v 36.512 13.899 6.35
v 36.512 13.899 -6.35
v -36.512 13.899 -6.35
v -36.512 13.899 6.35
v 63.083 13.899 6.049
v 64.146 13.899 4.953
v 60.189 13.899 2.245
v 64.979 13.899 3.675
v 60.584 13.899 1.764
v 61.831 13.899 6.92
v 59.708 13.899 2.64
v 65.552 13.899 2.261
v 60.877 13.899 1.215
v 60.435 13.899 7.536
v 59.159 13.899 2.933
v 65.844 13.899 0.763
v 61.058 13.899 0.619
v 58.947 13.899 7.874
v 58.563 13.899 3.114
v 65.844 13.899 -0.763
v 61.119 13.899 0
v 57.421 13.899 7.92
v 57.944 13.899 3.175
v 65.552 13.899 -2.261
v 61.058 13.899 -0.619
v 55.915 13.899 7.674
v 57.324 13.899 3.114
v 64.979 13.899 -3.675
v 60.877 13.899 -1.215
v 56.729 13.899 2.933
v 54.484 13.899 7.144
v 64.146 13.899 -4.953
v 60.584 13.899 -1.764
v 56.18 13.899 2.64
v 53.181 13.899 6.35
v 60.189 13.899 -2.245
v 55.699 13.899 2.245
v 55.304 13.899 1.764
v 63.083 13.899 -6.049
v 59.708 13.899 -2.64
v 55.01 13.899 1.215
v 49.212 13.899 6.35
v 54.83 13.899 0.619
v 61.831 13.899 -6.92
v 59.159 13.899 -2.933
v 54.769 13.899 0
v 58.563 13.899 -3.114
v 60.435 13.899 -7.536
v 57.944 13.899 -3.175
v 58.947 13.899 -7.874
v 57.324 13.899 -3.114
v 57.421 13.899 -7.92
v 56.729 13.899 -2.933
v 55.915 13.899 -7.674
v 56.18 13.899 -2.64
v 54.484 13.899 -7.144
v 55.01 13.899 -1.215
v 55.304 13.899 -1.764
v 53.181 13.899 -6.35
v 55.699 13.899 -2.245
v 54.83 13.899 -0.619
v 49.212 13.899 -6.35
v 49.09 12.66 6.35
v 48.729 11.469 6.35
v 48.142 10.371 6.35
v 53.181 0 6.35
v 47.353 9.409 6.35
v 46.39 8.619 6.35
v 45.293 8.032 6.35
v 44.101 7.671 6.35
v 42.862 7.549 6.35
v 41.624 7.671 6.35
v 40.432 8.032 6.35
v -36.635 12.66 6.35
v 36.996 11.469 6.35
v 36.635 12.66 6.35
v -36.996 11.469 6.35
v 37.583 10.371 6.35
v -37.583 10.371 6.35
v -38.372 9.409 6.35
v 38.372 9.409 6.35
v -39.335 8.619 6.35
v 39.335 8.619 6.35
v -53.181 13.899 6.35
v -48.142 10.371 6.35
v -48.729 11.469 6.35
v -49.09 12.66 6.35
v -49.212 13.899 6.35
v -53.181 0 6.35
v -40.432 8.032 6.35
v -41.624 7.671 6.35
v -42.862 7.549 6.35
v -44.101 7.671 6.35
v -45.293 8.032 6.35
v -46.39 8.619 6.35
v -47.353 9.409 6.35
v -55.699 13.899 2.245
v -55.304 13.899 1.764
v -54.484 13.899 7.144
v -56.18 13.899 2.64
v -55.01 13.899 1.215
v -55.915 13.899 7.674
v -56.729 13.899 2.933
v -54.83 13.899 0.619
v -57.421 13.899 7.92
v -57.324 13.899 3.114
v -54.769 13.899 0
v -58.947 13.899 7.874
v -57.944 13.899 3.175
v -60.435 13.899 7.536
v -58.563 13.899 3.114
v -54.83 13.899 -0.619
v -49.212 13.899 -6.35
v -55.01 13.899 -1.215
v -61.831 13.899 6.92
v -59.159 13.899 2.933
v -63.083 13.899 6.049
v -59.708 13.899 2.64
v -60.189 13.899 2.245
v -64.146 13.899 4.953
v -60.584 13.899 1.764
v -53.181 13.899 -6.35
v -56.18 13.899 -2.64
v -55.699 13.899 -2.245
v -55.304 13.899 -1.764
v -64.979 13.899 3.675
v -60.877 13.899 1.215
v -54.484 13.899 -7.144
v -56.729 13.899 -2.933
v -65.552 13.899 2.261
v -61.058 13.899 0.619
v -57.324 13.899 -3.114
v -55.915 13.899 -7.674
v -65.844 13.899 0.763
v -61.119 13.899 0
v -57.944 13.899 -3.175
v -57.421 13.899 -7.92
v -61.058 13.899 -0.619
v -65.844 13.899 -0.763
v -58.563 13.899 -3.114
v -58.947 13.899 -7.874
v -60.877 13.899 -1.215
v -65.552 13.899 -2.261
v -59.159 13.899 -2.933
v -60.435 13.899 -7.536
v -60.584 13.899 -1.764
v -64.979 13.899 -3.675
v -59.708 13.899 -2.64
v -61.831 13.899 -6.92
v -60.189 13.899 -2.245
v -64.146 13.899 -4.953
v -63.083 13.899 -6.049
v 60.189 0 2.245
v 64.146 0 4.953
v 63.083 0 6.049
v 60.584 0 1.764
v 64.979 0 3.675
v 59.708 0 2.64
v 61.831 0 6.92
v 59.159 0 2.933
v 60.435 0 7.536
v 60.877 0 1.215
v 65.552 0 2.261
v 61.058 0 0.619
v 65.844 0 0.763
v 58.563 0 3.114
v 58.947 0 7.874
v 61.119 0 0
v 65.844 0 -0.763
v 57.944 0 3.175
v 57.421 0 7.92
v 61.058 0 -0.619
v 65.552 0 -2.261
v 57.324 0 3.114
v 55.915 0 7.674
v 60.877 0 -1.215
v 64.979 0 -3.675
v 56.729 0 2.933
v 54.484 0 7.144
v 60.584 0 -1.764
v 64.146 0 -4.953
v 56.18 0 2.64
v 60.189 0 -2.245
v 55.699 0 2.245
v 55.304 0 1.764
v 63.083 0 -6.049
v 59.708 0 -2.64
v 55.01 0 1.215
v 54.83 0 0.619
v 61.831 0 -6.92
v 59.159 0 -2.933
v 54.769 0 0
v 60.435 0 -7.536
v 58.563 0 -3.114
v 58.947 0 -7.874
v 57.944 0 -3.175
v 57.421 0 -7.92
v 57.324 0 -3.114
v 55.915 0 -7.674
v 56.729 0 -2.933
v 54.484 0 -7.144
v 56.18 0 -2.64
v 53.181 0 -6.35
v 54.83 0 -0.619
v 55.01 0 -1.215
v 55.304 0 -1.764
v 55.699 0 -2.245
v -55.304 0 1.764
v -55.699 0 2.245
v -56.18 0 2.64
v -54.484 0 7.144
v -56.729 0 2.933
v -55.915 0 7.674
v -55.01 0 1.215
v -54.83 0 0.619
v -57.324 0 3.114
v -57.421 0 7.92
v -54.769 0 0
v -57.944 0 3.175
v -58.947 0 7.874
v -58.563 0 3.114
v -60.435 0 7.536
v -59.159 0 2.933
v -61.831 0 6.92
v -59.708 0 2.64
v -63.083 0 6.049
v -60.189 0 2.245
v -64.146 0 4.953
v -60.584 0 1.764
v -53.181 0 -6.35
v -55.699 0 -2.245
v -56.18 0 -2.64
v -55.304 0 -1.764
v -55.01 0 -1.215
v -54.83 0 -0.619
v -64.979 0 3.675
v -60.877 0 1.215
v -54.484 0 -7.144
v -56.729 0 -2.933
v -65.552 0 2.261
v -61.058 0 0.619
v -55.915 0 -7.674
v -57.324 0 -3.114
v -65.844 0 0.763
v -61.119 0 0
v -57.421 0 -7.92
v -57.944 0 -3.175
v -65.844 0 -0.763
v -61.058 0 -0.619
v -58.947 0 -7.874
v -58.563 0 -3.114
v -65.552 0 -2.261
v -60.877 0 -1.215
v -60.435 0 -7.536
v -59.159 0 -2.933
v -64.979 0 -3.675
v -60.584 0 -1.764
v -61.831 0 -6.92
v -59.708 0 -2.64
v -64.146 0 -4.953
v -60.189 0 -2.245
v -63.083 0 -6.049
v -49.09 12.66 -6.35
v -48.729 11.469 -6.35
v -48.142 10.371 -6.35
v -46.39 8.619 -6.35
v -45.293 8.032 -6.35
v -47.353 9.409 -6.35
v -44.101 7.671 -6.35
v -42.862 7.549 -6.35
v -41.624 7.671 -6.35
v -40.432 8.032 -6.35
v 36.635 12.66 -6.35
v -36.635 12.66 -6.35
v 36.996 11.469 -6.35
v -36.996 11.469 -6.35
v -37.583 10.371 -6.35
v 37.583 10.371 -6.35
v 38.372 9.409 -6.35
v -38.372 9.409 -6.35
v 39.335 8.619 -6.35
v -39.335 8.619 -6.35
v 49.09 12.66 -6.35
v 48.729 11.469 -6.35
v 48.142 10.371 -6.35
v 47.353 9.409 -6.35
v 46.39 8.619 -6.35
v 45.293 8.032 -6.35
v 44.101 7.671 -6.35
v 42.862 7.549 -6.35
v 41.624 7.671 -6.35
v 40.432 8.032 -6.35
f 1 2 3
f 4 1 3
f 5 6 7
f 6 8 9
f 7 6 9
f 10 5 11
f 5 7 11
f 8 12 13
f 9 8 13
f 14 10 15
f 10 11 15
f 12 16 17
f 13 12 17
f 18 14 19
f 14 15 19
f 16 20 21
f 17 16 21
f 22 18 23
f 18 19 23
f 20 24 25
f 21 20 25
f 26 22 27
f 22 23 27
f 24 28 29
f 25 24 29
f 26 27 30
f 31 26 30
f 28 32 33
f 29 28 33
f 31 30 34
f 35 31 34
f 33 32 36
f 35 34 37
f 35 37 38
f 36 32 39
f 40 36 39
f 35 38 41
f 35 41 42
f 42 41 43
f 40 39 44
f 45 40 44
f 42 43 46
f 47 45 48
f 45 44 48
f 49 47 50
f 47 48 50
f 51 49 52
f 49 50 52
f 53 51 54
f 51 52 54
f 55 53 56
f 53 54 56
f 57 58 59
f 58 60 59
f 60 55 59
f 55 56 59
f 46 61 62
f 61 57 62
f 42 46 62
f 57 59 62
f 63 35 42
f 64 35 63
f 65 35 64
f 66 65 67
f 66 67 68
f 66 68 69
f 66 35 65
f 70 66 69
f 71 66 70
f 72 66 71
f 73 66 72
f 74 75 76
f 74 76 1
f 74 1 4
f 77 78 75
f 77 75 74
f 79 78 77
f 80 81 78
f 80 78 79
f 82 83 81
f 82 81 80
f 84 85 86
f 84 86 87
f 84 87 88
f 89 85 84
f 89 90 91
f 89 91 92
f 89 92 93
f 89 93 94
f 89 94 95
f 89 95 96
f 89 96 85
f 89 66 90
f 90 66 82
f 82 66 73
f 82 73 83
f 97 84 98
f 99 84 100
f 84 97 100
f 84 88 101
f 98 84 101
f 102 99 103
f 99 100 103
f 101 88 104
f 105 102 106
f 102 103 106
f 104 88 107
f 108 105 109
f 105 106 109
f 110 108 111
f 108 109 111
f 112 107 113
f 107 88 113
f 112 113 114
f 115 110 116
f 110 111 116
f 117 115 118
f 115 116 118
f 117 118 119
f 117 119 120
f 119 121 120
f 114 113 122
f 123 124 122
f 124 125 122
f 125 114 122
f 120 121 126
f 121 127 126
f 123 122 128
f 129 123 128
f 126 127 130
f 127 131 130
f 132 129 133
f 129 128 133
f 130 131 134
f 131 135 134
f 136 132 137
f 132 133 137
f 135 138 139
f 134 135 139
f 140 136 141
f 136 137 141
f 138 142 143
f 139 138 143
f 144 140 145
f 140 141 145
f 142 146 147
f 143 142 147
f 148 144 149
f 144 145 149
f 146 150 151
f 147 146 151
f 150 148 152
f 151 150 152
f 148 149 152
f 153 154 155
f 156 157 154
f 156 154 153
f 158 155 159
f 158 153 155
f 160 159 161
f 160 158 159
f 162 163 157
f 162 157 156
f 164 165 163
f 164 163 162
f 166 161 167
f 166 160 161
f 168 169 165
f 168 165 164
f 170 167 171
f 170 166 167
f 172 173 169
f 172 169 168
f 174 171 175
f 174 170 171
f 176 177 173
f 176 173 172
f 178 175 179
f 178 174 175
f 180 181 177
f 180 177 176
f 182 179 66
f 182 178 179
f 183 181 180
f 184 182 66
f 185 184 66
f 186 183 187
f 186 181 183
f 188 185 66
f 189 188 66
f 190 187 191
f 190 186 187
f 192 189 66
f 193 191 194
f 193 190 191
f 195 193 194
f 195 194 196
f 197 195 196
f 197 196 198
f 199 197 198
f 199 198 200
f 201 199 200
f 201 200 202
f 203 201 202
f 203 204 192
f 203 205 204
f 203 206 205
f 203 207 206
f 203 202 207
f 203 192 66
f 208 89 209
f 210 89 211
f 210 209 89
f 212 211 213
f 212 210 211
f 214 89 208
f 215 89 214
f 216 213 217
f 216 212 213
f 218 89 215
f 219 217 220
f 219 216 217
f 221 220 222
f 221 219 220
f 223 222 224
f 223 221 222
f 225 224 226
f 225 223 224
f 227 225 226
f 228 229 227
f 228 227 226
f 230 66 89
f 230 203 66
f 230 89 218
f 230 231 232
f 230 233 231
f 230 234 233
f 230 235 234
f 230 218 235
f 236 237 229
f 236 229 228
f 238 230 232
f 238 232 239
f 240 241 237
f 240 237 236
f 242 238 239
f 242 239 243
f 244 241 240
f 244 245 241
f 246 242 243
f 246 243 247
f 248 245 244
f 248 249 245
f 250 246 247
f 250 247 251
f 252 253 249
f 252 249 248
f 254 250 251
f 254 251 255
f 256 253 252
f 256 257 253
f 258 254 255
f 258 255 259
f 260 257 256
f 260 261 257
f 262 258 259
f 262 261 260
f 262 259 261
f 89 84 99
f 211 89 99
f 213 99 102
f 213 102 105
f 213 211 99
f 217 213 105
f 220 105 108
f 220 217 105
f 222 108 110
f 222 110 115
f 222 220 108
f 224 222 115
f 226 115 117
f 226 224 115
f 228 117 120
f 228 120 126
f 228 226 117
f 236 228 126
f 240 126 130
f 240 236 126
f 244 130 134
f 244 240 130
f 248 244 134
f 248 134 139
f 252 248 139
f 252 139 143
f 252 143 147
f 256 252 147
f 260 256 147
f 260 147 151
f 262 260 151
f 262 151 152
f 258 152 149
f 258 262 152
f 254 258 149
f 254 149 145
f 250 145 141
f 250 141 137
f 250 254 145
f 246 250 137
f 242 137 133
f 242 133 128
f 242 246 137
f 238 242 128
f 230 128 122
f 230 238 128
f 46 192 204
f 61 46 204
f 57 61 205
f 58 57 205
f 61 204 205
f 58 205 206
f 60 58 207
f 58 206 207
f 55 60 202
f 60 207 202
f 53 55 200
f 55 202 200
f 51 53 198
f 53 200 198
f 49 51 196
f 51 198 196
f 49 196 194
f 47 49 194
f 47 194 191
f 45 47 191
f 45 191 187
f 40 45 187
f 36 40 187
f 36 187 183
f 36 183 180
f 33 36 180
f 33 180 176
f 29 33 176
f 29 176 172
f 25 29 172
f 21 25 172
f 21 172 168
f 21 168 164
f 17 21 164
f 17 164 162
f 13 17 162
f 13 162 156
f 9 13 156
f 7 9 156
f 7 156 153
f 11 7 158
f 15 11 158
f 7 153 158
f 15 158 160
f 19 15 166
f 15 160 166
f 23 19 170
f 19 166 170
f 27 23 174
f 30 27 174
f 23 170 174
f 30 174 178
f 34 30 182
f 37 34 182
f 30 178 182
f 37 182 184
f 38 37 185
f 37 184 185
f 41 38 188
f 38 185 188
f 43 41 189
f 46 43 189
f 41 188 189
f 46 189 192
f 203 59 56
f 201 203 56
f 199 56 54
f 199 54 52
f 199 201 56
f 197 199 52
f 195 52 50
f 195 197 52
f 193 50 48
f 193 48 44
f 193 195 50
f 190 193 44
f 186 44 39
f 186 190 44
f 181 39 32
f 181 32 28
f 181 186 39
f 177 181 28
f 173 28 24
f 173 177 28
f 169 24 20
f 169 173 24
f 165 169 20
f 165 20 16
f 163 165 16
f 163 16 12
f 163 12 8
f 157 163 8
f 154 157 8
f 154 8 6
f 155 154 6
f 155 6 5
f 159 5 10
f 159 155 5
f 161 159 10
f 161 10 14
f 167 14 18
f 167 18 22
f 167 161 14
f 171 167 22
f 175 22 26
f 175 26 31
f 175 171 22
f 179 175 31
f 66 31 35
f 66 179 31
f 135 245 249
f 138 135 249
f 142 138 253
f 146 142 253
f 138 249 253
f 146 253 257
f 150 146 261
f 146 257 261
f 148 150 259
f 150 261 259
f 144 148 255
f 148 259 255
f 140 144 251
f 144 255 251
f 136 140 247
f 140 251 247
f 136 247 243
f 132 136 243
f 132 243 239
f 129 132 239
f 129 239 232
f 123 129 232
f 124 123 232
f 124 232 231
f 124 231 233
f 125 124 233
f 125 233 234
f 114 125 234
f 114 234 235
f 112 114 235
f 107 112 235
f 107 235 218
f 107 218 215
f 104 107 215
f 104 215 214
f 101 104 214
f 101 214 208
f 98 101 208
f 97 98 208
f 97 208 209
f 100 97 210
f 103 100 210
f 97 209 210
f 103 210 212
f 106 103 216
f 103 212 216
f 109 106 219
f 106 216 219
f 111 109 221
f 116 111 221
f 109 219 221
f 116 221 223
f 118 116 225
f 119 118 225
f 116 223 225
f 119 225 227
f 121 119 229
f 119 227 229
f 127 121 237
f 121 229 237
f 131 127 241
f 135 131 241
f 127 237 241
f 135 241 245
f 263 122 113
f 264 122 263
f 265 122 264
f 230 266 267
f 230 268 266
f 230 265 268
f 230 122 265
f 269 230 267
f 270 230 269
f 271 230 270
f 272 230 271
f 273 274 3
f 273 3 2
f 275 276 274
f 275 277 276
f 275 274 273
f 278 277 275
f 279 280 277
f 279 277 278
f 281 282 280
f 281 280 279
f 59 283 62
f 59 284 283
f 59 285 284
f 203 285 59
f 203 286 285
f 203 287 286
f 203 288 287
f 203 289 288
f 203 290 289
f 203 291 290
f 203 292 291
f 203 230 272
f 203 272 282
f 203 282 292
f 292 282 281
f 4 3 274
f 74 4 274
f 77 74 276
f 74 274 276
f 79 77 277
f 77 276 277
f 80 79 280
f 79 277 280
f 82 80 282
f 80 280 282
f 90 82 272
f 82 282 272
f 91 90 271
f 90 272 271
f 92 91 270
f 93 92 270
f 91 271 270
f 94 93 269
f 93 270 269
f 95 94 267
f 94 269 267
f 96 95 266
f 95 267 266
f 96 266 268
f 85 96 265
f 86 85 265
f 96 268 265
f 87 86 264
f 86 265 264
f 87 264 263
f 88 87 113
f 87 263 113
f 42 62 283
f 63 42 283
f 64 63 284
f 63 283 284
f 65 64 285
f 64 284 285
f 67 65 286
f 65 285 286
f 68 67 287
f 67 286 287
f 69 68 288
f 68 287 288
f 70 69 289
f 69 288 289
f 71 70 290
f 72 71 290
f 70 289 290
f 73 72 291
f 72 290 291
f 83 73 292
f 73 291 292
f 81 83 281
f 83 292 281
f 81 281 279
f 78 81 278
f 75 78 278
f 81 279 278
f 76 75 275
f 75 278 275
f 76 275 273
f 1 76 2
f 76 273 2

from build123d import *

# Parameters (mm, degrees)
BOSS_EXTRUDE1_DEPTH         = 13.89888
CUT_EXTRUDE1_DEPTH          = 69.830593656
CUT_EXTRUDE1_DEPTH_BACK     = 69.830593656
F_1_4_0_25_DIAMETER_HOLE1_D = 6.35


with BuildPart() as part:
    # Sketch1 → Boss-Extrude1 (new body)
    with BuildSketch(Plane(origin=(0, 0, 0), x_dir=(1, 0, 0), z_dir=(0, 1, 0))):
        with BuildLine():
            Line((-53.18125, 6.35), (53.18125, 6.35))
            ThreePointArc((53.18125, 6.35), (65.88125, 0), (53.18125, -6.35))
            Line((53.18125, -6.35), (-53.18125, -6.35))
            ThreePointArc((-53.18125, -6.35), (-65.88125, 0), (-53.18125, 6.35))
        make_face()
    extrude(amount=BOSS_EXTRUDE1_DEPTH)

    # Sketch2 → Cut-Extrude1 (cut, two sides: drawn at the far end of the back side and taken through both)
    with BuildSketch(Plane.XY.offset(6.35).offset(-CUT_EXTRUDE1_DEPTH_BACK)):
        with BuildLine():
            Line((-49.2125, 13.89888), (-36.5125, 13.89888))
            ThreePointArc((-36.5125, 13.89888), (-42.8625, 7.54888), (-49.2125, 13.89888))
        make_face()
        with BuildLine():
            Line((36.5125, 13.89888), (49.2125, 13.89888))
            ThreePointArc((49.2125, 13.89888), (42.8625, 7.54888), (36.5125, 13.89888))
        make_face()
    extrude(amount=CUT_EXTRUDE1_DEPTH + CUT_EXTRUDE1_DEPTH_BACK, mode=Mode.SUBTRACT)

    # 1/4 (0.25) Diameter Hole1 (through all)
    with Locations(Plane(origin=(0, 13.89888, 0), x_dir=(1, 0, 0), z_dir=(0, 1, 0))):
        with Locations((-57.94375, 0), (57.94375, 0)):
            Hole(F_1_4_0_25_DIAMETER_HOLE1_D / 2)


solid = part.part
